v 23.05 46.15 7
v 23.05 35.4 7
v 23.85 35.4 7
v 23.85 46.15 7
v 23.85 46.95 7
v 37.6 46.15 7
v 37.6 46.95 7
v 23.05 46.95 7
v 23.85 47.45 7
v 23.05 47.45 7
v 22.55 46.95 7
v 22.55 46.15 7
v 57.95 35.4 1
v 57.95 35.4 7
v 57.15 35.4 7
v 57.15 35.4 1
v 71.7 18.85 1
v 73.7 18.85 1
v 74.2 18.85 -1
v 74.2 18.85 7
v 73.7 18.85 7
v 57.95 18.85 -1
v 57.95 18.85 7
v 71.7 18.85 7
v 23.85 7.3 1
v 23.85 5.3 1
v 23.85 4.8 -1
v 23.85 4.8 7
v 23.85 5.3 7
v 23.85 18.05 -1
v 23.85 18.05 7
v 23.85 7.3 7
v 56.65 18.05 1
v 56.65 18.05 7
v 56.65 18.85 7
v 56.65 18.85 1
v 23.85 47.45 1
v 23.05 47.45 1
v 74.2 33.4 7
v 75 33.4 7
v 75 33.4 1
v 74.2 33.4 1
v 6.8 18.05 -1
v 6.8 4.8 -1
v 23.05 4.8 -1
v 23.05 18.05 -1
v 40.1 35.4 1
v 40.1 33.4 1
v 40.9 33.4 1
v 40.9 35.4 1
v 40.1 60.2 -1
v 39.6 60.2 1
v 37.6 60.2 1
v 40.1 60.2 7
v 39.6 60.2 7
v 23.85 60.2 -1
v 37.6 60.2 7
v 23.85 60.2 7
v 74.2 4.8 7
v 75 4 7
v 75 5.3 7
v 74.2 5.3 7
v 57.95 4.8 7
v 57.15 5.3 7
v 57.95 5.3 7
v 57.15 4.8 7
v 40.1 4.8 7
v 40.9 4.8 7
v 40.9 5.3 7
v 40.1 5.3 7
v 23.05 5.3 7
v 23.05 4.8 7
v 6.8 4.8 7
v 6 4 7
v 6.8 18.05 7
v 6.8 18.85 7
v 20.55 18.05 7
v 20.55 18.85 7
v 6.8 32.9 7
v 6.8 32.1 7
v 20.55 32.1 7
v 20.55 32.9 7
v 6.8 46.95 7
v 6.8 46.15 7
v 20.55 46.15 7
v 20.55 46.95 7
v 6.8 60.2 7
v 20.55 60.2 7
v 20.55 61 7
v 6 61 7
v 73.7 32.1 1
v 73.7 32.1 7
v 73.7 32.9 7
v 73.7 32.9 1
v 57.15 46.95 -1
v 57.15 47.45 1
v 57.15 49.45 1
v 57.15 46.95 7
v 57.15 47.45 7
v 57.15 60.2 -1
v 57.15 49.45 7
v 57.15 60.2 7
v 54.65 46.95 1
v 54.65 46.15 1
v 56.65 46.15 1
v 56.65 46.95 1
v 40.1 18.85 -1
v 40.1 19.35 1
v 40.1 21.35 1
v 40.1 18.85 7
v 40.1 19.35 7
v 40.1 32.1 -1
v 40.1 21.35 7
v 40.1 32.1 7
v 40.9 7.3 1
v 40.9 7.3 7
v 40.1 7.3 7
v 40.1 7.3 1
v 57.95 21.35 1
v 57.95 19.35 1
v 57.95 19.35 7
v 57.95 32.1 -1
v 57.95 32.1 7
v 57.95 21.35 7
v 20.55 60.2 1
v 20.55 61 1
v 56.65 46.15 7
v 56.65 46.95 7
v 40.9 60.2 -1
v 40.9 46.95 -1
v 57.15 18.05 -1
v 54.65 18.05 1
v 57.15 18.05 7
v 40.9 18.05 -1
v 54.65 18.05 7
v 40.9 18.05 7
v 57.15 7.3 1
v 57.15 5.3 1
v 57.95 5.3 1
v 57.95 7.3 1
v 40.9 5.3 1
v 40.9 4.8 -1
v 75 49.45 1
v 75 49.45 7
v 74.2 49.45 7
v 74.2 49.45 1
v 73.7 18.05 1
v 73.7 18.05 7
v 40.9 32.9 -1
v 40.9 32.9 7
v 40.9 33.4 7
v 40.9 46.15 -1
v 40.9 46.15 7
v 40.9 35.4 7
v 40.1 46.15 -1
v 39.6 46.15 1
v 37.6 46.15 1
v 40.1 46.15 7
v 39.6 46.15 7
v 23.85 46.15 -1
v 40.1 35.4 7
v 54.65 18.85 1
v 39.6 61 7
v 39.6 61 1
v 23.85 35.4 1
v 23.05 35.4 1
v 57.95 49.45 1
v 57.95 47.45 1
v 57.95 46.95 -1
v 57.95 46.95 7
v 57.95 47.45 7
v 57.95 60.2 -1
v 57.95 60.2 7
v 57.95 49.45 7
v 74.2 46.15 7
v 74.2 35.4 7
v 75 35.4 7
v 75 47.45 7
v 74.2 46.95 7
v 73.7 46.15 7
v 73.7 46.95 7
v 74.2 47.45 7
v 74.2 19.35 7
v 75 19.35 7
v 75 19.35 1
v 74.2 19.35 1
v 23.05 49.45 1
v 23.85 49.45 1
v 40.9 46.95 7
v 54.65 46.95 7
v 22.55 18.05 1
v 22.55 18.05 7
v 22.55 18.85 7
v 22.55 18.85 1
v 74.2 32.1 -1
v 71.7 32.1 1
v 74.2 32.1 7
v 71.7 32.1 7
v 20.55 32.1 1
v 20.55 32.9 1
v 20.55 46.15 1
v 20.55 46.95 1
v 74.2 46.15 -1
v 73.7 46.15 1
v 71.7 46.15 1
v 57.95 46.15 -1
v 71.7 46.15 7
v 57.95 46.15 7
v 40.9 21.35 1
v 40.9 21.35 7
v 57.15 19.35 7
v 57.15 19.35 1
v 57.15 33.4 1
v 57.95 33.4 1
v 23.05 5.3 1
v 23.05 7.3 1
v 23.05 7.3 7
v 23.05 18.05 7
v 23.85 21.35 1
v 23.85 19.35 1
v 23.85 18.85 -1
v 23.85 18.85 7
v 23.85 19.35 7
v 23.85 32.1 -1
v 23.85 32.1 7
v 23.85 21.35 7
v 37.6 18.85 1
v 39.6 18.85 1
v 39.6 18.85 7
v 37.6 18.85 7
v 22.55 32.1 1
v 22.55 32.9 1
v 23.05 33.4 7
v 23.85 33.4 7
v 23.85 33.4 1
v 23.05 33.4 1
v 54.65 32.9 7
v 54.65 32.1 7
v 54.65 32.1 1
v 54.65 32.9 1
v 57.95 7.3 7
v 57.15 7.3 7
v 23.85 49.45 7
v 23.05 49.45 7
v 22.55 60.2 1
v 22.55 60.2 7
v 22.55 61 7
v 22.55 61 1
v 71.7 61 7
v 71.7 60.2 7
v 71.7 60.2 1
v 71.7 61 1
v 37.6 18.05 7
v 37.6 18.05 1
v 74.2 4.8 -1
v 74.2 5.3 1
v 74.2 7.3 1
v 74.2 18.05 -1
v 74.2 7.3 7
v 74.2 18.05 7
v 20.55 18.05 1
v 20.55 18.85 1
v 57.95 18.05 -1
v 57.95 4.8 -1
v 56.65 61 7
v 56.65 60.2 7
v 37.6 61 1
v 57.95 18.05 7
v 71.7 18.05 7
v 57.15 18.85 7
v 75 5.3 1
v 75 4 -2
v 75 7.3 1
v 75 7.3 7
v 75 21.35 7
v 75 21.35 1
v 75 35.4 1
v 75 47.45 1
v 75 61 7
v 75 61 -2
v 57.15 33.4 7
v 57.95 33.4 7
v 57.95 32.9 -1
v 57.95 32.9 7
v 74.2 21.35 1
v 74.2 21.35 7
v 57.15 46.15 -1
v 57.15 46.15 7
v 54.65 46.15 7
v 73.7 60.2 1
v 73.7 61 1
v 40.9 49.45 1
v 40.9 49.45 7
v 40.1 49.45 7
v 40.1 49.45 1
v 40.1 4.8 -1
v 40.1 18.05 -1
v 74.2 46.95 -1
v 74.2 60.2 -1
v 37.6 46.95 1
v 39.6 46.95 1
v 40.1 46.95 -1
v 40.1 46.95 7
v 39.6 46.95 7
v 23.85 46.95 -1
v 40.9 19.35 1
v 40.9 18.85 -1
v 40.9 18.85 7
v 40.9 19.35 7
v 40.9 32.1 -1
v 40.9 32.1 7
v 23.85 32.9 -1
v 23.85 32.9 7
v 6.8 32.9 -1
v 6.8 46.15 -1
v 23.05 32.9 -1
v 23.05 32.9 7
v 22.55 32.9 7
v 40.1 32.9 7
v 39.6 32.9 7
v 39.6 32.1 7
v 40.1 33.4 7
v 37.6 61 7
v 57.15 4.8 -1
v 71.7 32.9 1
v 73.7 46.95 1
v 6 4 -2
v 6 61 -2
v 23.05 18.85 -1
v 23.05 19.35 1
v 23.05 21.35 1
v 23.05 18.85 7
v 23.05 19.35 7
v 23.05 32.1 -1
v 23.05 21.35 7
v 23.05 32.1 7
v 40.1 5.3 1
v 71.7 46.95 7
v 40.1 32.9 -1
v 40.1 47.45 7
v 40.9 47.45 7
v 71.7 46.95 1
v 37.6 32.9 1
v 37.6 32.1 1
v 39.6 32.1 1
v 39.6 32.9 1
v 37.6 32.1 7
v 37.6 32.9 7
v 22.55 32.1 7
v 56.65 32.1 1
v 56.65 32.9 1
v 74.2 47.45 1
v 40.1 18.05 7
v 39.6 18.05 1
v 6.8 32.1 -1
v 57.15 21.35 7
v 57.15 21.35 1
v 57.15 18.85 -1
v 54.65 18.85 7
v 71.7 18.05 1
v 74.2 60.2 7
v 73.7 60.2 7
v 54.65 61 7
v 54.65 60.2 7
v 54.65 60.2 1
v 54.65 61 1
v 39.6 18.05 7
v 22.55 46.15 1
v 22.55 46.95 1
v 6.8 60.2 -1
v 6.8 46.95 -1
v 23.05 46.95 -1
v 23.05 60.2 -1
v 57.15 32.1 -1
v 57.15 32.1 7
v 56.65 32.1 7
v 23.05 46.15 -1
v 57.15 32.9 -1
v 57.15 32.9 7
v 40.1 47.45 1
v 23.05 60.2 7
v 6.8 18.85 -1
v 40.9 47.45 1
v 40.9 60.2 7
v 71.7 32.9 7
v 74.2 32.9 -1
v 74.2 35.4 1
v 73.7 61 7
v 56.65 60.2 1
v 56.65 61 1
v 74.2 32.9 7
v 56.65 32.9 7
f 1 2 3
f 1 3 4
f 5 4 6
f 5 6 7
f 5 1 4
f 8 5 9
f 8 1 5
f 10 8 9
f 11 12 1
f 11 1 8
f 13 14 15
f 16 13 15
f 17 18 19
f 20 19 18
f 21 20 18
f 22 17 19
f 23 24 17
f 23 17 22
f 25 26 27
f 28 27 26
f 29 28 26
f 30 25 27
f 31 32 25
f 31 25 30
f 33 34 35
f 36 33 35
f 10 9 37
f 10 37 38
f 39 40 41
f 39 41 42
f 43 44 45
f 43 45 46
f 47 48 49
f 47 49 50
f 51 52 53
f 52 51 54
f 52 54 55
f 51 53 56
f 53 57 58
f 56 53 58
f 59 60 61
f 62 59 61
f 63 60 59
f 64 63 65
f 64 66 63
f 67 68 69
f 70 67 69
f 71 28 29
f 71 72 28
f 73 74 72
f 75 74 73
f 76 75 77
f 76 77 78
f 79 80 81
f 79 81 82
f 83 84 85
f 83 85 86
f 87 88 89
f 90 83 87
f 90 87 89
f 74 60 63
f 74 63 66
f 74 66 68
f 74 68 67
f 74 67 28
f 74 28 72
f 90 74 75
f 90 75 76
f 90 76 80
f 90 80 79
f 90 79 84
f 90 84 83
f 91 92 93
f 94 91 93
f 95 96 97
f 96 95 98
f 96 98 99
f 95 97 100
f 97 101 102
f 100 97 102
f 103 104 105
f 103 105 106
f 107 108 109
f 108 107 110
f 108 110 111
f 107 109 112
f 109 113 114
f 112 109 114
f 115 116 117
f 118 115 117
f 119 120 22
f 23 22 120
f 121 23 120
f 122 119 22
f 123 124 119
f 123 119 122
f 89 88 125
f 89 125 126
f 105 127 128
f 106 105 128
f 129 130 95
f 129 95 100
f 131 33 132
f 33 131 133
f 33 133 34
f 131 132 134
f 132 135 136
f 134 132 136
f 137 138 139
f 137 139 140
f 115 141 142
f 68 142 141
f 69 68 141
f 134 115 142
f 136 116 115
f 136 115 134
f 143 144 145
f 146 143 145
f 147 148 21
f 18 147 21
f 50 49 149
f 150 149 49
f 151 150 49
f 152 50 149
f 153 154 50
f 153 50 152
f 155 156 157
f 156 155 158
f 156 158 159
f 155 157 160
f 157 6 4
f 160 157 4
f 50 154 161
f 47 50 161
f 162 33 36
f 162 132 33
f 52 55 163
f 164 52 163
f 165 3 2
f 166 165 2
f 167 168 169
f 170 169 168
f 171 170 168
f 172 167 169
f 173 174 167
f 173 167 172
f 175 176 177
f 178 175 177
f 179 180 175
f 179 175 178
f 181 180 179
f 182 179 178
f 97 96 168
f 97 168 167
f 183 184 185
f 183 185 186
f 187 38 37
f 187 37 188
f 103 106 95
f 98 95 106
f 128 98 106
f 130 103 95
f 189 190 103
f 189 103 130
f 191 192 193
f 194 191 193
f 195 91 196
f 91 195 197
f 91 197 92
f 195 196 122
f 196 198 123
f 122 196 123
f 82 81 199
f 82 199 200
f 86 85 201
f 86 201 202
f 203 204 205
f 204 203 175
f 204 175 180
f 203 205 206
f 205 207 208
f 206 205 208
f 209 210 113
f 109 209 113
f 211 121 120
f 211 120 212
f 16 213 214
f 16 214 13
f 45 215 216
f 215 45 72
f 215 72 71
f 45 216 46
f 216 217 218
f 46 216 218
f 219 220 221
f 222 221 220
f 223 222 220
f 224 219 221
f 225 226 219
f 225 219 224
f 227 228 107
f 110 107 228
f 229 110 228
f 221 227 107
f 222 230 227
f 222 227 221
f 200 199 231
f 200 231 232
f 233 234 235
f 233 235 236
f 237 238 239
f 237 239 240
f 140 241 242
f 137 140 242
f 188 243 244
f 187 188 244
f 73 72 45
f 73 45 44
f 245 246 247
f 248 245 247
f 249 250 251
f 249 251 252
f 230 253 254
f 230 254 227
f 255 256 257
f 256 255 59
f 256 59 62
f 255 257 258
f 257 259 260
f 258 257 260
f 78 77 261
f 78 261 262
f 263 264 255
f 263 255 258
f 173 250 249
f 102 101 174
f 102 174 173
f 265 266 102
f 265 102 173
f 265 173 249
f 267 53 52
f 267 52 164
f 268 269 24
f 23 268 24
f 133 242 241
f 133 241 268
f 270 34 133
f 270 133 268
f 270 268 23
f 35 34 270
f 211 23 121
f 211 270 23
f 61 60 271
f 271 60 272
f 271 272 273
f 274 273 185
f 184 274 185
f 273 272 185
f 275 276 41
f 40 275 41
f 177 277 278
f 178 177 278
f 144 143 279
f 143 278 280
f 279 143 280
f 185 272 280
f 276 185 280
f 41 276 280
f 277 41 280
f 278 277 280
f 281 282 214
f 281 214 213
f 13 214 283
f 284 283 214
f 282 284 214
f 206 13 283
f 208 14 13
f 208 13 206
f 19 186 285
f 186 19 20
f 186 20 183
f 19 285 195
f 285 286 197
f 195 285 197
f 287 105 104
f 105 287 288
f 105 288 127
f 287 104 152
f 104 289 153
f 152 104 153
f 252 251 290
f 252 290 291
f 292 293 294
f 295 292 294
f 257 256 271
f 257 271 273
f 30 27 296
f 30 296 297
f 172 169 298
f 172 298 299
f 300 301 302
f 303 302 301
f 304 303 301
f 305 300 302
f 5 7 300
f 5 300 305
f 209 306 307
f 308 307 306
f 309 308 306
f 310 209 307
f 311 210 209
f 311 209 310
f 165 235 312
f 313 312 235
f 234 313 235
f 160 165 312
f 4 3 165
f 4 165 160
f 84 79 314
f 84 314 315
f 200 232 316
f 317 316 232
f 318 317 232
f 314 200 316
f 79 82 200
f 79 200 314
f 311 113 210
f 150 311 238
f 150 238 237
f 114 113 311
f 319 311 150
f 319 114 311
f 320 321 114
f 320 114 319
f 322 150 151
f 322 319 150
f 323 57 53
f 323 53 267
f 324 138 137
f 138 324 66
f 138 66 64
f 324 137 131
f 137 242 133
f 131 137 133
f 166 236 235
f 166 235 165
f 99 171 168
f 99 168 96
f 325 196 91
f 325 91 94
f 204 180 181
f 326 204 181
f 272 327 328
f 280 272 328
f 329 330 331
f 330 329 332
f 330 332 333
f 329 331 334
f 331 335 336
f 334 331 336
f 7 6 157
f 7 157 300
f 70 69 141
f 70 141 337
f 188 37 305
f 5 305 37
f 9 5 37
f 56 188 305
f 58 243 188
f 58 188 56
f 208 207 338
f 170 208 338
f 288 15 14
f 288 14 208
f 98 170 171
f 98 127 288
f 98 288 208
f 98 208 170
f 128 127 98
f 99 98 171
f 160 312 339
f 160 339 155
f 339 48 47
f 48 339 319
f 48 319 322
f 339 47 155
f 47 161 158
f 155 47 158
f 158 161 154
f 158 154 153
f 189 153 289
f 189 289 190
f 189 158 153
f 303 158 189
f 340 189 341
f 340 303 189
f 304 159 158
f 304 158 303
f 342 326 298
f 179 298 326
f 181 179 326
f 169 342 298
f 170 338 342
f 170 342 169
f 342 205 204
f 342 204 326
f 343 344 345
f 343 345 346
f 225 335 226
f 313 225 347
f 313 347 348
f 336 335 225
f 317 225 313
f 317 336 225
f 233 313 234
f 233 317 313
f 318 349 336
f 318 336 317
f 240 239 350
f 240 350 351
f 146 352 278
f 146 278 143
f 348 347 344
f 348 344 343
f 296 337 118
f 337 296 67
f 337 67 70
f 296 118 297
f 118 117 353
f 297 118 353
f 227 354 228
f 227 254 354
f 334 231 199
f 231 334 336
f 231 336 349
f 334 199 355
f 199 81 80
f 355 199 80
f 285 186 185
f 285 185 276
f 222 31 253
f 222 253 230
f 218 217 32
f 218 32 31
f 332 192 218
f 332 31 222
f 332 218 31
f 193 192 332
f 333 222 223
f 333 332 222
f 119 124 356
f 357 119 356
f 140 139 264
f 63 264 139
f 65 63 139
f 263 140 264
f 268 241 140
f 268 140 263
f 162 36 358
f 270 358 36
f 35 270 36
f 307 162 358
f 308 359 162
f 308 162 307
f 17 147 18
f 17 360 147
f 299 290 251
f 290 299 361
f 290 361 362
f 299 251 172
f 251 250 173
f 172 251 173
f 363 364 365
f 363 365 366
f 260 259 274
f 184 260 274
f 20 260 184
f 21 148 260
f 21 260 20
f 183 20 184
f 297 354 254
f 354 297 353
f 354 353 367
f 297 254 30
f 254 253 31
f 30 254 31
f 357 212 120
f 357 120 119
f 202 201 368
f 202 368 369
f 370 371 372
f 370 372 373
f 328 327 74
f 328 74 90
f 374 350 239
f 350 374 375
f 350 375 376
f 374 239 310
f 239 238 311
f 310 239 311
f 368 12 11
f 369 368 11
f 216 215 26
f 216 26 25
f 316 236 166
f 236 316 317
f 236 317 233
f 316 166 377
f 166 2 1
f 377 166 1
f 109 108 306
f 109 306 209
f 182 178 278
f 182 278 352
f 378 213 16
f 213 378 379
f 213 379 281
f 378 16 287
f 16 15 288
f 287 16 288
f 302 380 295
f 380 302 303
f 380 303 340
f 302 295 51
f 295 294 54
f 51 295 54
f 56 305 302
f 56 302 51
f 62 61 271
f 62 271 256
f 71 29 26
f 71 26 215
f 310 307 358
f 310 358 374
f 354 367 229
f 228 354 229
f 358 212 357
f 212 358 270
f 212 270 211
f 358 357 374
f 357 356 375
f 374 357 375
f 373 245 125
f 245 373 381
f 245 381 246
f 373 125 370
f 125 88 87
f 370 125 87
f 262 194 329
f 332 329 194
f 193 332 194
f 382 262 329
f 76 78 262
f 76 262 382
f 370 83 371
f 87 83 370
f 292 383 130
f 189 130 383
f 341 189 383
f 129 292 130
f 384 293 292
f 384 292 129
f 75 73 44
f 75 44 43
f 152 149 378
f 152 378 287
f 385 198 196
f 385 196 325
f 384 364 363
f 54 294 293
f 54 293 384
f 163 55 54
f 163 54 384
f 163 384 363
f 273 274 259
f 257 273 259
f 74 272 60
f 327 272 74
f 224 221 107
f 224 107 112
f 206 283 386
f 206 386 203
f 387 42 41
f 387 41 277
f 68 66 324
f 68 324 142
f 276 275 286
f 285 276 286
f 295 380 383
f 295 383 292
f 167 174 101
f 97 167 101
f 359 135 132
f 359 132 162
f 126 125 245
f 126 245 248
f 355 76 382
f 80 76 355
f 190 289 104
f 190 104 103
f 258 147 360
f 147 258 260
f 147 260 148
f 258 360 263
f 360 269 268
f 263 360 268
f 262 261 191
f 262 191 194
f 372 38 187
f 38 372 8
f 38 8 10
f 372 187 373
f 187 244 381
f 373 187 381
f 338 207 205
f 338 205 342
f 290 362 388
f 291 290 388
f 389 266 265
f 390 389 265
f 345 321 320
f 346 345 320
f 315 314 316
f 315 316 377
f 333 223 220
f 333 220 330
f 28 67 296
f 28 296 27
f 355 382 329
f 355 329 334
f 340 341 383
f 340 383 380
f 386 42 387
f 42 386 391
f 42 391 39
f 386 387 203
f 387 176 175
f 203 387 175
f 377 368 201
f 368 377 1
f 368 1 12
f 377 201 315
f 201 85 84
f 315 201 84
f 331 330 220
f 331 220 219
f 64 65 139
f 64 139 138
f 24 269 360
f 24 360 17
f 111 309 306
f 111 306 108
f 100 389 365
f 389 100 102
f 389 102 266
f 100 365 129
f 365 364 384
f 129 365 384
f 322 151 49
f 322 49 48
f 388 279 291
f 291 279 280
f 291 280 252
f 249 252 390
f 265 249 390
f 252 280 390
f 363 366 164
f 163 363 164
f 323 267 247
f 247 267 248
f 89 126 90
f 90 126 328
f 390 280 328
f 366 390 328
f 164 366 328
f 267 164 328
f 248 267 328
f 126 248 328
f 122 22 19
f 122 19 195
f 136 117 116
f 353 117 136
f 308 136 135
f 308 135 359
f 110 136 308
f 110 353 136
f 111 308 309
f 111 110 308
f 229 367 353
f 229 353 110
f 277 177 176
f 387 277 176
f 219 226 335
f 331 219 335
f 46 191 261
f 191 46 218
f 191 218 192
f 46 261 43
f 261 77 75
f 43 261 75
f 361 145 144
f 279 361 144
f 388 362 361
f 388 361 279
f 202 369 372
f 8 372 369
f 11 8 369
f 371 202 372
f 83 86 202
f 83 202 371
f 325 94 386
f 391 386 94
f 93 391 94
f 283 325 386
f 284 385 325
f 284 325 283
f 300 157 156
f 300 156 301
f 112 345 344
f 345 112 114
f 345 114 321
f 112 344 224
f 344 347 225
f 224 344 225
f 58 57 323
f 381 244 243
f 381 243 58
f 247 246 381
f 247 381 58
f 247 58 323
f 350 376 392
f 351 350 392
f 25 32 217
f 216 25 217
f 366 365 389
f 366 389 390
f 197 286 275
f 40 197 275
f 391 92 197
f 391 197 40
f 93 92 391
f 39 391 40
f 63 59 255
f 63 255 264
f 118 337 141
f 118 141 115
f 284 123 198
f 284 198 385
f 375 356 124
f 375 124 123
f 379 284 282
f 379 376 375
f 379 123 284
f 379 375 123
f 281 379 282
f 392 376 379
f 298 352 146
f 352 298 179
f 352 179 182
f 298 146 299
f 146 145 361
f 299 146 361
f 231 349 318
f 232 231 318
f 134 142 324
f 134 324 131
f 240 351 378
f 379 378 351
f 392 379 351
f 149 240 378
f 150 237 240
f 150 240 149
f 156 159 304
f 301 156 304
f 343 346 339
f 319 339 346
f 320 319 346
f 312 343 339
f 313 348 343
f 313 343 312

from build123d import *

# Parameters (mm, degrees)
SKETCH_W             = 57
SKETCH_H             = 69
PAD_DEPTH            = 9
SKETCH001_W          = 13.25
SKETCH001_H          = 16.25
POCKET_DEPTH         = 8
SKETCH002_W          = 2
SKETCH002_H          = 51.95
SKETCH002_W_2        = 42.95
SKETCH002_H_2        = 2
POCKET015_DEPTH      = 6
BODY_PLACEMENT_ANGLE = 90


with BuildPart() as part:
    # Sketch → Pad (new body)
    with BuildSketch(Plane.XY):
        with Locations((28.5, 34.5)):
            Rectangle(SKETCH_W, SKETCH_H)
    extrude(amount=PAD_DEPTH)

    # Sketch001 (on Face6 of Pad) → Pocket (cut)
    with BuildSketch(Plane.XY.offset(9)):
        with Locations((7.425, 60.075)):
            Rectangle(SKETCH001_W, SKETCH001_H)
        with Locations((21.475, 60.075)):
            Rectangle(SKETCH001_W, SKETCH001_H)
        with Locations((35.525, 60.075)):
            Rectangle(SKETCH001_W, SKETCH001_H)
        with Locations((49.575, 60.075)):
            Rectangle(SKETCH001_W, SKETCH001_H)
        with Locations((7.425, 43.025)):
            Rectangle(SKETCH001_W, SKETCH001_H)
        with Locations((7.425, 25.975)):
            Rectangle(SKETCH001_W, SKETCH001_H)
        with Locations((7.425, 8.925)):
            Rectangle(SKETCH001_W, SKETCH001_H)
        with Locations((21.475, 43.025)):
            Rectangle(SKETCH001_W, SKETCH001_H)
        with Locations((35.525, 43.025)):
            Rectangle(SKETCH001_W, SKETCH001_H)
        with Locations((49.575, 43.025)):
            Rectangle(SKETCH001_W, SKETCH001_H)
        with Locations((21.475, 25.975)):
            Rectangle(SKETCH001_W, SKETCH001_H)
        with Locations((35.525, 25.975)):
            Rectangle(SKETCH001_W, SKETCH001_H)
        with Locations((49.575, 25.975)):
            Rectangle(SKETCH001_W, SKETCH001_H)
        with Locations((21.475, 8.925)):
            Rectangle(SKETCH001_W, SKETCH001_H)
        with Locations((35.525, 8.925)):
            Rectangle(SKETCH001_W, SKETCH001_H)
        with Locations((49.575, 8.925)):
            Rectangle(SKETCH001_W, SKETCH001_H)
    extrude(amount=-POCKET_DEPTH, mode=Mode.SUBTRACT)

    # Sketch002 (on Face5 of Pocket) → Pocket015 (cut)
    with BuildSketch(Plane.XY.offset(9)):
        with Locations((2.3, 25.975)):
            Rectangle(SKETCH002_W, SKETCH002_H)
        with Locations((16.35, 25.975)):
            Rectangle(SKETCH002_W, SKETCH002_H)
        with Locations((30.4, 25.975)):
            Rectangle(SKETCH002_W, SKETCH002_H)
        with Locations((44.45, 25.975)):
            Rectangle(SKETCH002_W, SKETCH002_H)
        with Locations((35.525, 53.45)):
            Rectangle(SKETCH002_W_2, SKETCH002_H_2)
        with Locations((35.525, 36.4)):
            Rectangle(SKETCH002_W_2, SKETCH002_H_2)
        with Locations((35.525, 19.35)):
            Rectangle(SKETCH002_W_2, SKETCH002_H_2)
        with Locations((35.525, 2.3)):
            Rectangle(SKETCH002_W_2, SKETCH002_H_2)
    extrude(amount=-POCKET015_DEPTH, mode=Mode.SUBTRACT)


with BuildPart() as part_1:
    # Body placement: moved
    add(part.part.moved(Location((75, 4, -2))).rotate(Axis((75, 4, -2), (0, 0, 1)), BODY_PLACEMENT_ANGLE))


solid = part_1.part
